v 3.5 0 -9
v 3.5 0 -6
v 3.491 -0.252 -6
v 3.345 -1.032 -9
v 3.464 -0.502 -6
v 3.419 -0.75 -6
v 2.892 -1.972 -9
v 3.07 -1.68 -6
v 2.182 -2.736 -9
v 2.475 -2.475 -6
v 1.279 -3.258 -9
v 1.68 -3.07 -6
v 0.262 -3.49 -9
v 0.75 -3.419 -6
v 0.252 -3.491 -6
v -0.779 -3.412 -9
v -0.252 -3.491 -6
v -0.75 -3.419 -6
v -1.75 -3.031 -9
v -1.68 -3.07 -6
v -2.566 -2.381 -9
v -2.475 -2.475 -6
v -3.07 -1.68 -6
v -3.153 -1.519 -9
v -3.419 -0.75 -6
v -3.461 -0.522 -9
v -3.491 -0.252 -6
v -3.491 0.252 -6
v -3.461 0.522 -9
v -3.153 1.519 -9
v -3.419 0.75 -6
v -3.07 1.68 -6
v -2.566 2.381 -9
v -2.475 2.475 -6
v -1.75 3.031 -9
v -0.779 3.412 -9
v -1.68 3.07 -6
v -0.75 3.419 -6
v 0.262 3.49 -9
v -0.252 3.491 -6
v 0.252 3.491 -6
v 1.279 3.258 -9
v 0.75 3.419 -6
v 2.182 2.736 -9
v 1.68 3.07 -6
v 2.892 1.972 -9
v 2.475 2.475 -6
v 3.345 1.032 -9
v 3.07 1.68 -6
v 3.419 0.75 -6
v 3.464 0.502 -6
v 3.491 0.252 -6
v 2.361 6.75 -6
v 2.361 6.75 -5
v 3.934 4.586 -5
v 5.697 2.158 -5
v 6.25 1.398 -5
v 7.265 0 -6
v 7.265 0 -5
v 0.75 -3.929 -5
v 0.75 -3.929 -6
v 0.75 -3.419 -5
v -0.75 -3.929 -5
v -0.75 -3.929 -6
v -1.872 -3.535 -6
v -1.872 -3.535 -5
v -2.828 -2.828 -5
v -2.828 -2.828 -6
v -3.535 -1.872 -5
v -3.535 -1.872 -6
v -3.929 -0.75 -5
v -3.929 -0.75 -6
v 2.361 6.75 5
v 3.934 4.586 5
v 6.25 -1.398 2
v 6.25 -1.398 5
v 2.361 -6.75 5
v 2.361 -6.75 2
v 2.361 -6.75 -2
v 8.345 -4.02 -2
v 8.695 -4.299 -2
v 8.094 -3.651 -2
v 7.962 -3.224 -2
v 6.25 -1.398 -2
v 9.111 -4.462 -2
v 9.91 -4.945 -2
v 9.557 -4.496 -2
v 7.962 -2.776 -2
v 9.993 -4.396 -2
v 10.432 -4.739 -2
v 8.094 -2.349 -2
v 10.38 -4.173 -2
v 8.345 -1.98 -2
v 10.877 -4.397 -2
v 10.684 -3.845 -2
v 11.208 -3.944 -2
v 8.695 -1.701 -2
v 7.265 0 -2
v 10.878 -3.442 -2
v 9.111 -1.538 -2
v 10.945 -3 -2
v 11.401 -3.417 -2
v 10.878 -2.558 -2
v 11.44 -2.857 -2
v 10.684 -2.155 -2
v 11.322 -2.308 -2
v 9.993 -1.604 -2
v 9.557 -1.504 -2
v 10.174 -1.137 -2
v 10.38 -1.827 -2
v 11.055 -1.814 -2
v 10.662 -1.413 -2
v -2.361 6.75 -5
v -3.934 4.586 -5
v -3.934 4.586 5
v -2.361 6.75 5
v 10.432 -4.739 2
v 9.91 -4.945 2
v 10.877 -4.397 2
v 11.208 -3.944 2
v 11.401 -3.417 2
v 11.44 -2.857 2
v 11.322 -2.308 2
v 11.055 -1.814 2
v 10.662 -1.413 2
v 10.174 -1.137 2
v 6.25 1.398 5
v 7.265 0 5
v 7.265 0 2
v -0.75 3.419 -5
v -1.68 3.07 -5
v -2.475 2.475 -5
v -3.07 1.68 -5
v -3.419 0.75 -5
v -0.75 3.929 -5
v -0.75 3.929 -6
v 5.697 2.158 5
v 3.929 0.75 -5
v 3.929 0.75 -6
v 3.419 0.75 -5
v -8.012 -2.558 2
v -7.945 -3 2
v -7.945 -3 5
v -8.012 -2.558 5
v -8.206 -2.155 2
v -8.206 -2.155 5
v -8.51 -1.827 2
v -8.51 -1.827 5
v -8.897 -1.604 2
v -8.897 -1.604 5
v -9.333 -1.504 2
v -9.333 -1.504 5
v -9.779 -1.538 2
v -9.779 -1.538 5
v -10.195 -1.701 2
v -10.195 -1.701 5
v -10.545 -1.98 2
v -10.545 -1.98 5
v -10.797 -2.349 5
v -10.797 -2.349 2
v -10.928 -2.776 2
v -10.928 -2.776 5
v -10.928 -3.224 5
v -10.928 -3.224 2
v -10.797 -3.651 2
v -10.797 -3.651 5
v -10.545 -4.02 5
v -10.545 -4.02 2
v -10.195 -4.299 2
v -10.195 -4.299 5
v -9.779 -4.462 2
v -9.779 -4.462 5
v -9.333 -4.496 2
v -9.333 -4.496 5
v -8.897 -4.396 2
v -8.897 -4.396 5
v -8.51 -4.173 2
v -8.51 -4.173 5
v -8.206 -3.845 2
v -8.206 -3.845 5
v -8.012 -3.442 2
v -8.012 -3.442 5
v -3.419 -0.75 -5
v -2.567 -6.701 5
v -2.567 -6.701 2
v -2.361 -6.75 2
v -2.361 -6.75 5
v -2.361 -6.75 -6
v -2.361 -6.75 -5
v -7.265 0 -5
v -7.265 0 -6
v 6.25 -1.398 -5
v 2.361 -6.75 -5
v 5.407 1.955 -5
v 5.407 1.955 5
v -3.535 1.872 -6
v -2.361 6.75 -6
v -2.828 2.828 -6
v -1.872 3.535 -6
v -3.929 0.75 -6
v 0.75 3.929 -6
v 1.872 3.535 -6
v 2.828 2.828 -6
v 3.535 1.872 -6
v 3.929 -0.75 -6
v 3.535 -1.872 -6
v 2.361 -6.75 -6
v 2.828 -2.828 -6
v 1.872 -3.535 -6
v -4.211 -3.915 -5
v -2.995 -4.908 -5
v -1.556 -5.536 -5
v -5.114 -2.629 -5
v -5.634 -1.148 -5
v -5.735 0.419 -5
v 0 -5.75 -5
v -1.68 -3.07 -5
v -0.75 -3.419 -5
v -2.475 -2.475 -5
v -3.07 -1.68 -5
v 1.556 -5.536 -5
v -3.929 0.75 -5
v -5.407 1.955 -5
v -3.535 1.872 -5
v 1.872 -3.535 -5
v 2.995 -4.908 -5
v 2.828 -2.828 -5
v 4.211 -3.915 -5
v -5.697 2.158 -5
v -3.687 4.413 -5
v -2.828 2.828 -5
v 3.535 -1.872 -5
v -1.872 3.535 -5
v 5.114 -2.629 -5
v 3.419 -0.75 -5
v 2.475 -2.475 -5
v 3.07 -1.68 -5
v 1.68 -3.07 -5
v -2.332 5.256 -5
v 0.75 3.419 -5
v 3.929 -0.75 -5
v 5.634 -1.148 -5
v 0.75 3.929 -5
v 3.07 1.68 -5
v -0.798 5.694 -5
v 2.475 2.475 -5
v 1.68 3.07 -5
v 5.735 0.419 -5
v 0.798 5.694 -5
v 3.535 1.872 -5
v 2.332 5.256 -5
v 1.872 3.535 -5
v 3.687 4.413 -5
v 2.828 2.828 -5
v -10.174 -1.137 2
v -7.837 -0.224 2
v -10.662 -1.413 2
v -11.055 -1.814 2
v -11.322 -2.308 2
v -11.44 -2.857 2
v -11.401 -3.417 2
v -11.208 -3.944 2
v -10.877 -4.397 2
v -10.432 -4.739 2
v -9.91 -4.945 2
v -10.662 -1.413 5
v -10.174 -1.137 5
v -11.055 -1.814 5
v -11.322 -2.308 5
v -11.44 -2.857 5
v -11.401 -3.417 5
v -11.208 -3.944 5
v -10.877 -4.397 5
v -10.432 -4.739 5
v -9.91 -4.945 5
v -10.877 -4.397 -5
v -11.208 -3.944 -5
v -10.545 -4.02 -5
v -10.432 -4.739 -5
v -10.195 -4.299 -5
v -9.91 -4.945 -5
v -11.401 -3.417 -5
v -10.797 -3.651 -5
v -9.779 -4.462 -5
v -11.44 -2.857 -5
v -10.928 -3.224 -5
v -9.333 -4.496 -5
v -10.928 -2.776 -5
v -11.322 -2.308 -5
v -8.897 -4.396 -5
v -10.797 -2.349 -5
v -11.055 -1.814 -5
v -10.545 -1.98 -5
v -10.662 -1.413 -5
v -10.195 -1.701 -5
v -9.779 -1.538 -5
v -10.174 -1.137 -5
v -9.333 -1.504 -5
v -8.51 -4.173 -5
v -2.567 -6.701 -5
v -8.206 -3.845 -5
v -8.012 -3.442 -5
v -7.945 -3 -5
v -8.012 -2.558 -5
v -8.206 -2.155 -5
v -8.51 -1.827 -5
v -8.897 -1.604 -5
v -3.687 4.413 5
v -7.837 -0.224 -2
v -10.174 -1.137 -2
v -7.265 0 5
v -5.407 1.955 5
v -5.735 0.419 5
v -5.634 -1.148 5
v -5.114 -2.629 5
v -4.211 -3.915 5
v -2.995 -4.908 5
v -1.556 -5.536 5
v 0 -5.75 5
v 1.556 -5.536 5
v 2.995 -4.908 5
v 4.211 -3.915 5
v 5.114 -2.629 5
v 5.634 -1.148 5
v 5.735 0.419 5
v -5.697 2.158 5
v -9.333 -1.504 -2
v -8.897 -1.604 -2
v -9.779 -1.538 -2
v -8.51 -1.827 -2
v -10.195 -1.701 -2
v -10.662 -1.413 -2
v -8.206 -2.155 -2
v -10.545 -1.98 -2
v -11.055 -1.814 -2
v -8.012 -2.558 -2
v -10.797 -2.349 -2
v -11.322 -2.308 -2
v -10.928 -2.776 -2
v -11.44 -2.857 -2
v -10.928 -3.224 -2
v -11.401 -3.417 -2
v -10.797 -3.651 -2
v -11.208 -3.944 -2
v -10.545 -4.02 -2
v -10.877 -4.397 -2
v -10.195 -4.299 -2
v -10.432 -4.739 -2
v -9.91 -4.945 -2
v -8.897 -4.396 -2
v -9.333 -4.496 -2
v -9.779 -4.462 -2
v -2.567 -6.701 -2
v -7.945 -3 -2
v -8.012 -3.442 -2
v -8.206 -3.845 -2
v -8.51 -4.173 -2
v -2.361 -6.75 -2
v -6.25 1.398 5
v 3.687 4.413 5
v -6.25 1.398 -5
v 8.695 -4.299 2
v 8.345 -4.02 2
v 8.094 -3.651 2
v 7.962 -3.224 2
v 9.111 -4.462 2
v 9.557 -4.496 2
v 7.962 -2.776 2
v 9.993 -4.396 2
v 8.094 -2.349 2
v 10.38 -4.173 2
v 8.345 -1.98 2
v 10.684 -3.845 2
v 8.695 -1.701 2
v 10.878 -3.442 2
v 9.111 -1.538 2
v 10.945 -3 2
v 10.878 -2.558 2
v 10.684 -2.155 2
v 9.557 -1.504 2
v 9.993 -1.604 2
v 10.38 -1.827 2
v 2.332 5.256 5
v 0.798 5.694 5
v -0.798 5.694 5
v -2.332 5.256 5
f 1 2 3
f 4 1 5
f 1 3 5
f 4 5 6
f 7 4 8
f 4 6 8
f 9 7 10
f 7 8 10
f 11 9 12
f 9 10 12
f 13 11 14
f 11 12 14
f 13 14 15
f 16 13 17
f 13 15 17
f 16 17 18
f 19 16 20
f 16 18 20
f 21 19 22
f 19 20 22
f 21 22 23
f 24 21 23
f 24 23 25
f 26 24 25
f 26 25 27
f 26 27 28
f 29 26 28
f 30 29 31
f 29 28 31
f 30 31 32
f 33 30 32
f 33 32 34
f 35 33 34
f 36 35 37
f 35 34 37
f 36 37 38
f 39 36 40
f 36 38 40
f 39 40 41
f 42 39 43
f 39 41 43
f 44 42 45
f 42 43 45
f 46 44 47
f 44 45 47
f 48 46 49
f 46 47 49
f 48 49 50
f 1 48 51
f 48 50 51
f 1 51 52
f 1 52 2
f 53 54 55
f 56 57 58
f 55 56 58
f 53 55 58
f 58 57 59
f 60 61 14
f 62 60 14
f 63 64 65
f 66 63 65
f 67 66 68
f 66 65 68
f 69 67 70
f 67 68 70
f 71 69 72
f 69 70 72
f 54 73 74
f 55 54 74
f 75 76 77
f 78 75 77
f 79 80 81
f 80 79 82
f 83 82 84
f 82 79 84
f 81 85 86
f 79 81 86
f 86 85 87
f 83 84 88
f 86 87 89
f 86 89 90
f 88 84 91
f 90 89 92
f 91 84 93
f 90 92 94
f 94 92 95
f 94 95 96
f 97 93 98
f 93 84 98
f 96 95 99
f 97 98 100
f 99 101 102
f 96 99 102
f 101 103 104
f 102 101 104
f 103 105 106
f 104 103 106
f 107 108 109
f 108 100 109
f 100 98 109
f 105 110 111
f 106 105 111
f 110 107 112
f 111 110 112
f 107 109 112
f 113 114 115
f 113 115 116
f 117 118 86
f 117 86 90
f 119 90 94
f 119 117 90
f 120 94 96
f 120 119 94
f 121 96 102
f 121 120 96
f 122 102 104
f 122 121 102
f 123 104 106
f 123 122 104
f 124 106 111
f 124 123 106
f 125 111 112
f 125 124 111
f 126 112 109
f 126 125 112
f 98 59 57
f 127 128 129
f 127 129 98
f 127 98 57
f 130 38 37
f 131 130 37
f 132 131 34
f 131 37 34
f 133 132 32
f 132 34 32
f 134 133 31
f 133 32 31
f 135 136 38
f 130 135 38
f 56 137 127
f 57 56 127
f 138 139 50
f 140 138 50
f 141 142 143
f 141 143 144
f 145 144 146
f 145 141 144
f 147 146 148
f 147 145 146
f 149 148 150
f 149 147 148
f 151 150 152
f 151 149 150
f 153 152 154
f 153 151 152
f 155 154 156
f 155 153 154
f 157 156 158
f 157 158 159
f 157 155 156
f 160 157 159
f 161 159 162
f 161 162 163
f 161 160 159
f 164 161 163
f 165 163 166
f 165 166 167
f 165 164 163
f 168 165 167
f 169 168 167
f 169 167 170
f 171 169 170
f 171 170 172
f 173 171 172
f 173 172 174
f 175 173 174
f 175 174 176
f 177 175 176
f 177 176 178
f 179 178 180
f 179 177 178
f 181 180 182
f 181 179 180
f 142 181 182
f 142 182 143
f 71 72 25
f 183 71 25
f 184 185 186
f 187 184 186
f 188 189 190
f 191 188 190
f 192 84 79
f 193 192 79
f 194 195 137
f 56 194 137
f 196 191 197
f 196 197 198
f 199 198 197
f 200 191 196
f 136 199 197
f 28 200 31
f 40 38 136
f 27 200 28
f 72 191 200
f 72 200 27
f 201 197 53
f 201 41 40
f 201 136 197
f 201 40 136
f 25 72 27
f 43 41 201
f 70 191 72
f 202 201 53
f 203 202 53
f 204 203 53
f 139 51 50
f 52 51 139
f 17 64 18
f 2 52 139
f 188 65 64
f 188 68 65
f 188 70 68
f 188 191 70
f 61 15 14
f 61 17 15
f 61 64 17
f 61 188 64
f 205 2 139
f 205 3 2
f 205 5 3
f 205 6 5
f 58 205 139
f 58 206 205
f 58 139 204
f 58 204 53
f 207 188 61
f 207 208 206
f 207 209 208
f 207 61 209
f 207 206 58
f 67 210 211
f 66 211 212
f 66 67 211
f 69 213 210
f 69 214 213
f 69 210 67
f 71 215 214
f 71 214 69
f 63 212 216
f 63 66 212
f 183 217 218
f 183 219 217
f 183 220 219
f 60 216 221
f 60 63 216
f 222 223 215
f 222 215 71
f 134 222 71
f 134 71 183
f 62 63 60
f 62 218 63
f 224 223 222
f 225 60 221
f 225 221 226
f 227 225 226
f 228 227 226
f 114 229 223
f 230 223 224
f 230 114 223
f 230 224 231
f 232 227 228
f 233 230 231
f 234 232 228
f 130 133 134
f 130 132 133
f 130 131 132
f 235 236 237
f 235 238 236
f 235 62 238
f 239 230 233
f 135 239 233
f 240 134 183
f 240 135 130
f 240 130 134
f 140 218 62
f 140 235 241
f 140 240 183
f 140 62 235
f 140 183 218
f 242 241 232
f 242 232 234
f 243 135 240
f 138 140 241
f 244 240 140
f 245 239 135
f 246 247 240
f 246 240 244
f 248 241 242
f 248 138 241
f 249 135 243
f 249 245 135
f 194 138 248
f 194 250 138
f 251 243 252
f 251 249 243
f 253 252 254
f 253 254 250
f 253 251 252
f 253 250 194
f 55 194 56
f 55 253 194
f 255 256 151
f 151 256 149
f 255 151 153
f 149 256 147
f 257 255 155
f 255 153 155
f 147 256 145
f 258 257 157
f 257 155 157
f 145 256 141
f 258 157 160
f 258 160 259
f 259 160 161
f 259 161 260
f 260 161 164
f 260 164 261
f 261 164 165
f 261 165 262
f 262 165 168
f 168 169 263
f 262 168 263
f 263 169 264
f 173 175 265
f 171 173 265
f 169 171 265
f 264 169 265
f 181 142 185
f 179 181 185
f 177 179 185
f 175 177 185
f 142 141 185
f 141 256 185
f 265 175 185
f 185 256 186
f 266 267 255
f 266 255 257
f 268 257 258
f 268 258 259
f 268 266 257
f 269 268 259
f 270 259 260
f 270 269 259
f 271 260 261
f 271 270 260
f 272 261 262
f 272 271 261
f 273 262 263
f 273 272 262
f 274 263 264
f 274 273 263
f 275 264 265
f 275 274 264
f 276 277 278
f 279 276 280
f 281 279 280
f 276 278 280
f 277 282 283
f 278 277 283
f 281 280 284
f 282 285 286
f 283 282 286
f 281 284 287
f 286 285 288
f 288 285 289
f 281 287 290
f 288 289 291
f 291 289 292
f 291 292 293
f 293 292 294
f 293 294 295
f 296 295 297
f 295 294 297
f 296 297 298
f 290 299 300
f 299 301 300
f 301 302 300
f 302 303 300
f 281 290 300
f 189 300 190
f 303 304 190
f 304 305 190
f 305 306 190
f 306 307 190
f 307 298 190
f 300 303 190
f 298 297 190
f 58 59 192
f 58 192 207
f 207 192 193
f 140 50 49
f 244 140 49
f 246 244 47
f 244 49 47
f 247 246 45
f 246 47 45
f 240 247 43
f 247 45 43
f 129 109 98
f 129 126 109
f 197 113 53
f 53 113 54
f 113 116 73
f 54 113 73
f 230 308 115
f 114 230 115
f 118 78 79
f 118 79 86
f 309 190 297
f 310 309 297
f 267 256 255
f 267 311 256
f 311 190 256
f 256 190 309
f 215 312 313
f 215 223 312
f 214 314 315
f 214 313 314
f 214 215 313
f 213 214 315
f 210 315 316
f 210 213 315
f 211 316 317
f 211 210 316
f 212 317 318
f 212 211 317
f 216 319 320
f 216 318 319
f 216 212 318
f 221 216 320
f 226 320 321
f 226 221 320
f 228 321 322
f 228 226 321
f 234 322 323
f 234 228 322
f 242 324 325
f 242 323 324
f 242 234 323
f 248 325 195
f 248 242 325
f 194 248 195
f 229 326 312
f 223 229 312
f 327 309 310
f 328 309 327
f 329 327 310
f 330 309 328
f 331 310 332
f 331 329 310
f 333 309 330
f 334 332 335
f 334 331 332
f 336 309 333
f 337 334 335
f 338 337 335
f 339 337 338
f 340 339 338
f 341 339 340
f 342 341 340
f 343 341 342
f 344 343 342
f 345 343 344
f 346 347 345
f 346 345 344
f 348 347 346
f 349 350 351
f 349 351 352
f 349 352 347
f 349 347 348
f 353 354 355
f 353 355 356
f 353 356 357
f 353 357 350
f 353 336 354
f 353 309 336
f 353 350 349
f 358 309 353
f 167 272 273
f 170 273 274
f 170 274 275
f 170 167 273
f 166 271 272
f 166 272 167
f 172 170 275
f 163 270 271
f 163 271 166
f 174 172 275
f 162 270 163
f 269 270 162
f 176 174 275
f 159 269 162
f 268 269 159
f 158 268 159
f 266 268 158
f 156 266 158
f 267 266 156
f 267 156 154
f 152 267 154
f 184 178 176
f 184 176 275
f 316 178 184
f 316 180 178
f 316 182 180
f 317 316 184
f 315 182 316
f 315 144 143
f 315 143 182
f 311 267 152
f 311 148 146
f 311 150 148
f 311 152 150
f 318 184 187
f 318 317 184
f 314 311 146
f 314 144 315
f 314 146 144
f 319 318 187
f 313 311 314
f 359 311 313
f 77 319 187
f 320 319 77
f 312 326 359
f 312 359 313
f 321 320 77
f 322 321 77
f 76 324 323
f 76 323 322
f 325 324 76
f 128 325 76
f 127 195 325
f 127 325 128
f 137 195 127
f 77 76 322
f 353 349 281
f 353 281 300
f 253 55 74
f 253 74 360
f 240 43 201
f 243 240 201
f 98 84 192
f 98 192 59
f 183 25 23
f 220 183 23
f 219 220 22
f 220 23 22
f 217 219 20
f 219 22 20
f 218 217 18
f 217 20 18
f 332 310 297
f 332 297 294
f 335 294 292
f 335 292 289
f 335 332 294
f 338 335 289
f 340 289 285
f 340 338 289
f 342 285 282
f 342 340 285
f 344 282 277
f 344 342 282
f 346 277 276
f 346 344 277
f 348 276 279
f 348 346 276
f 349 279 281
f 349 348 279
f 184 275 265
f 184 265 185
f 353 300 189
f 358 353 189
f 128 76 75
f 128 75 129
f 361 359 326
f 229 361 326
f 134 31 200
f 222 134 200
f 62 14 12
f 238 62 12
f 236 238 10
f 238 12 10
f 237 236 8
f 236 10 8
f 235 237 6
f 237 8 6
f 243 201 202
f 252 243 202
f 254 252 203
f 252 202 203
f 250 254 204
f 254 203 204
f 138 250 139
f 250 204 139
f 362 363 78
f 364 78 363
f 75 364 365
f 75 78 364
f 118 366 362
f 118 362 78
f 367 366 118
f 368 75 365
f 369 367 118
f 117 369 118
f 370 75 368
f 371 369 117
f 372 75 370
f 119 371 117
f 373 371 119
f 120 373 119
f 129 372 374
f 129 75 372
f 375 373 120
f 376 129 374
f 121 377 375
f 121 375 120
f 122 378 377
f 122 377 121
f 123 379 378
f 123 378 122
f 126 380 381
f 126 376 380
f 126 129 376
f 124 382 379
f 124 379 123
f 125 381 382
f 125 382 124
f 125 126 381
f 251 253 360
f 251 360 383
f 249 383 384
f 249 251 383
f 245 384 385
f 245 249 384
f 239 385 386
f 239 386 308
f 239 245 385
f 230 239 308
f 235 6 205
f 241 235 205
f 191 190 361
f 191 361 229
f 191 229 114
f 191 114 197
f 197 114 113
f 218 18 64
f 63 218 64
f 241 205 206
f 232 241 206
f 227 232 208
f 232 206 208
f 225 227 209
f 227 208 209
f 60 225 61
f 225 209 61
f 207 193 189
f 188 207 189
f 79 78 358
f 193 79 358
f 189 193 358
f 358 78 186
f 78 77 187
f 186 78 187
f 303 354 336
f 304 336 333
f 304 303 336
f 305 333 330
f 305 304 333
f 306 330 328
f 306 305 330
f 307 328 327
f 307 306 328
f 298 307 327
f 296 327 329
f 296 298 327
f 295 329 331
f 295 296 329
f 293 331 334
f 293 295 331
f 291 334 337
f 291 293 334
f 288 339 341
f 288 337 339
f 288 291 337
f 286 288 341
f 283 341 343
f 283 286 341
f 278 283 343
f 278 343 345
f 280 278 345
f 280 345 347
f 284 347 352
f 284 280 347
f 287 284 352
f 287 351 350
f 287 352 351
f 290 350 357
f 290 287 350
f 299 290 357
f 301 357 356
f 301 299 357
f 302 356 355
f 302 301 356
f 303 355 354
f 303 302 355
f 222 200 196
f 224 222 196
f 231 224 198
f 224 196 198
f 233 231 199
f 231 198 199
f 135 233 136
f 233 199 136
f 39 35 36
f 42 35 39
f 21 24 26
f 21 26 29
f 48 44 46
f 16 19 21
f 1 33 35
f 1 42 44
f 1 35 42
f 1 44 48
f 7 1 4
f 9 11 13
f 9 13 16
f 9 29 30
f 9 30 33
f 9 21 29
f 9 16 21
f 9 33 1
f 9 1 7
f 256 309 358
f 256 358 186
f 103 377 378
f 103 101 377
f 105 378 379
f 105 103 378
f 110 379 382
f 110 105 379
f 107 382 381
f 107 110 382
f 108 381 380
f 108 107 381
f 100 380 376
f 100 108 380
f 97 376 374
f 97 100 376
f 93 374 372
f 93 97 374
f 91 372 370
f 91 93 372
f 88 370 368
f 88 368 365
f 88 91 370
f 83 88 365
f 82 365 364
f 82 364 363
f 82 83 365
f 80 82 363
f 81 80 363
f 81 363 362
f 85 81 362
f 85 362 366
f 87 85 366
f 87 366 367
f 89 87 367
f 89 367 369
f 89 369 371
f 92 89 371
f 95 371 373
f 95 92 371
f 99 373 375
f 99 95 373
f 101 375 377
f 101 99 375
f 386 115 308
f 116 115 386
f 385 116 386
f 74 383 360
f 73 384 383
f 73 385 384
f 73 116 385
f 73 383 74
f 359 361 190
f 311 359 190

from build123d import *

# Parameters (mm, degrees)
F0_W      = 12.5
F0_H      = 13.5
F0_R      = 5.75
F1_DEPTH  = 5
F3_DEPTH  = 5
F5_DEPTH  = 25
F6_R      = 1.5
F7_DEPTH  = 5
F9_DEPTH  = 1
F10_R     = 1.5
F11_DEPTH = 2
F13_W     = 6.183999799
F13_H     = 4
F14_DEPTH = 25
F17_DEPTH = 10
F20_DEPTH = 25
F21_R     = 3.5
F22_DEPTH = 3


# Not quite as in the source:
# - a feature of the source that left no trace in its solid (it failed there, or was rolled back) is left out
# - a feature names something its author has since deleted; it is built from what else it names


with BuildPart() as f1:
    # F0 (on Top) → F1 (new body, symmetric)
    with BuildSketch(Plane.XY):
        Rectangle(F0_W, F0_H)
        Circle(F0_R, mode=Mode.SUBTRACT)
    extrude(amount=F1_DEPTH, both=True)

    # F2 (on Top) → F3 (join, symmetric)
    with BuildSketch(Plane.XY):
        with BuildLine():
            Line((-4.7552825815, 3.4549150281), (-7.2654252801, 0))
            Line((-7.2654252801, 0), (-4.7552825815, -3.4549150281))
            ThreePointArc((-4.7552825815, -3.4549150281), (-5.8778525229, 0), (-4.7552825815, 3.4549150281))
        make_face()
        with BuildLine():
            Line((4.7552825815, -3.4549150281), (7.2654252801, 0))
            Line((7.2654252801, 0), (4.7552825815, 3.4549150281))
            ThreePointArc((4.7552825815, 3.4549150281), (5.8778525229, 0), (4.7552825815, -3.4549150281))
        make_face()
    extrude(amount=F3_DEPTH, both=True)

    # F4 (on face) → F5 (cut)
    with BuildSketch(Plane.XY.offset(5)):
        Polygon((-8.2530292036, 7.939198947), (-6.25, 1.3976129971), (-1.4972596068, 7.939198947), align=None)
        Polygon((-1.4972596068, -7.939198947), (-6.25, -1.3976129971), (-8.2530292036, -7.939198947), align=None)
        Polygon((8.2530292036, -7.939198947), (6.25, -1.3976129971), (1.4972596068, -7.939198947), align=None)
        Polygon((1.4972596068, 7.939198947), (6.25, 1.3976129971), (8.2530292036, 7.939198947), align=None)
    extrude(amount=-F5_DEPTH, mode=Mode.SUBTRACT)

    # F6 (on Top) → F7 (join, symmetric)
    with BuildSketch(Plane.XY):
        with BuildLine():
            Line((-7.2654252801, 0), (-10.173537518, -1.1373915846))
            ThreePointArc((-10.173537518, -1.1373915846), (-11.4402841733, -3.138029064), (-9.9101168699, -4.9451774907))
            Line((-9.9101168699, -4.9451774907), (-2.5670624157, -6.7007963666))
            Line((-2.5670624157, -6.7007963666), (-2.361263216, -6.75))
            Line((-2.361263216, -6.75), (-7.2654252801, 0))
        make_face()
        with Locations((-9.4450528641, -3)):
            Circle(F6_R, mode=Mode.SUBTRACT)
    extrude(amount=F7_DEPTH, both=True)

    # F8 (on face) → F9 (join)
    with BuildSketch(Plane(origin=(0, 0, -5), x_dir=(1, 0, 0), z_dir=(0, 0, -1))):
        Polygon((2.361263216, -6.75), (7.2654252801, 0), (2.361263216, 6.75), (-2.361263216, 6.75), (-7.2654252801, 0), (-2.361263216, -6.75), align=None)
    extrude(amount=F9_DEPTH)

    # F10 (on Top) → F11 (join, symmetric)
    with BuildSketch(Plane.XY):
        with BuildLine():
            Line((7.2654252801, 0), (2.361263216, -6.75))
            Line((2.361263216, -6.75), (9.9101168699, -4.9451774907))
            ThreePointArc((9.9101168699, -4.9451774907), (11.4402841733, -3.138029064), (10.173537518, -1.1373915846))
            Line((10.173537518, -1.1373915846), (7.2654252801, 0))
        make_face()
        with Locations((9.4450528641, -3)):
            Circle(F10_R, mode=Mode.SUBTRACT)
    extrude(amount=F11_DEPTH, both=True)

    # F13 (on face) → F14 (cut)
    with BuildSketch(Plane(origin=(2.3481090856, -2.7983674386, 0), x_dir=(-0.7660444431, -0.6427876097, 0), z_dir=(-0.6427876097, 0.7660444431, 0))):
        with Locations((9.2396488302, 0)):
            Rectangle(F13_W, F13_H)
    extrude(amount=F14_DEPTH, mode=Mode.SUBTRACT)

    # F16 (on face) → F17 (cut)
    with BuildSketch(Plane.XY.offset(5)):
        Polygon((-6.5190746712, 6.3958671101), (-8.2398039802, 3.9384109772), (-3.2558972089, 0.4486418862), (-1.5351678999, 2.906098019), align=None)
        Polygon((8.2398039802, 3.9384109772), (6.5190746712, 6.3958671101), (1.5351678999, 2.906098019), (3.2558972089, 0.4486418862), align=None)
    extrude(amount=-F17_DEPTH, mode=Mode.SUBTRACT)

    # F19 (on face) → F20 (cut)
    with BuildSketch(Plane(origin=(0, 0, -6), x_dir=(1, 0, 0), z_dir=(0, 0, -1))):
        with BuildLine():
            ThreePointArc((-3.4186985828, 0.75), (-2.4748737342, 2.4748737342), (-0.75, 3.4186985828))
            Line((-0.75, 3.4186985828), (-0.75, 3.9290584114))
            ThreePointArc((-0.75, 3.9290584114), (-2.8284271247, 2.8284271247), (-3.9290584114, 0.75))
            Line((-3.9290584114, 0.75), (-3.4186985828, 0.75))
        make_face()
        with BuildLine():
            Line((0.75, 3.9290584114), (0.75, 3.4186985828))
            ThreePointArc((0.75, 3.4186985828), (2.4748737342, 2.4748737342), (3.4186985828, 0.75))
            Line((3.4186985828, 0.75), (3.9290584114, 0.75))
            ThreePointArc((3.9290584114, 0.75), (2.8284271247, 2.8284271247), (0.75, 3.9290584114))
        make_face()
        with BuildLine():
            Line((-0.75, -3.9290584114), (-0.75, -3.4186985828))
            ThreePointArc((-0.75, -3.4186985828), (-2.4748737342, -2.4748737342), (-3.4186985828, -0.75))
            Line((-3.4186985828, -0.75), (-3.9290584114, -0.75))
            ThreePointArc((-3.9290584114, -0.75), (-2.8284271247, -2.8284271247), (-0.75, -3.9290584114))
        make_face()
        with BuildLine():
            ThreePointArc((3.4186985828, -0.75), (2.4748737342, -2.4748737342), (0.75, -3.4186985828))
            Line((0.75, -3.4186985828), (0.75, -3.9290584114))
            ThreePointArc((0.75, -3.9290584114), (2.8284271247, -2.8284271247), (3.9290584114, -0.75))
            Line((3.9290584114, -0.75), (3.4186985828, -0.75))
        make_face()
    extrude(amount=-F20_DEPTH, mode=Mode.SUBTRACT)

    # F21 (on face) → F22 (join)
    with BuildSketch(Plane(origin=(0, 0, -6), x_dir=(1, 0, 0), z_dir=(0, 0, -1))):
        Circle(F21_R)
    extrude(amount=F22_DEPTH)


solid = f1.part
